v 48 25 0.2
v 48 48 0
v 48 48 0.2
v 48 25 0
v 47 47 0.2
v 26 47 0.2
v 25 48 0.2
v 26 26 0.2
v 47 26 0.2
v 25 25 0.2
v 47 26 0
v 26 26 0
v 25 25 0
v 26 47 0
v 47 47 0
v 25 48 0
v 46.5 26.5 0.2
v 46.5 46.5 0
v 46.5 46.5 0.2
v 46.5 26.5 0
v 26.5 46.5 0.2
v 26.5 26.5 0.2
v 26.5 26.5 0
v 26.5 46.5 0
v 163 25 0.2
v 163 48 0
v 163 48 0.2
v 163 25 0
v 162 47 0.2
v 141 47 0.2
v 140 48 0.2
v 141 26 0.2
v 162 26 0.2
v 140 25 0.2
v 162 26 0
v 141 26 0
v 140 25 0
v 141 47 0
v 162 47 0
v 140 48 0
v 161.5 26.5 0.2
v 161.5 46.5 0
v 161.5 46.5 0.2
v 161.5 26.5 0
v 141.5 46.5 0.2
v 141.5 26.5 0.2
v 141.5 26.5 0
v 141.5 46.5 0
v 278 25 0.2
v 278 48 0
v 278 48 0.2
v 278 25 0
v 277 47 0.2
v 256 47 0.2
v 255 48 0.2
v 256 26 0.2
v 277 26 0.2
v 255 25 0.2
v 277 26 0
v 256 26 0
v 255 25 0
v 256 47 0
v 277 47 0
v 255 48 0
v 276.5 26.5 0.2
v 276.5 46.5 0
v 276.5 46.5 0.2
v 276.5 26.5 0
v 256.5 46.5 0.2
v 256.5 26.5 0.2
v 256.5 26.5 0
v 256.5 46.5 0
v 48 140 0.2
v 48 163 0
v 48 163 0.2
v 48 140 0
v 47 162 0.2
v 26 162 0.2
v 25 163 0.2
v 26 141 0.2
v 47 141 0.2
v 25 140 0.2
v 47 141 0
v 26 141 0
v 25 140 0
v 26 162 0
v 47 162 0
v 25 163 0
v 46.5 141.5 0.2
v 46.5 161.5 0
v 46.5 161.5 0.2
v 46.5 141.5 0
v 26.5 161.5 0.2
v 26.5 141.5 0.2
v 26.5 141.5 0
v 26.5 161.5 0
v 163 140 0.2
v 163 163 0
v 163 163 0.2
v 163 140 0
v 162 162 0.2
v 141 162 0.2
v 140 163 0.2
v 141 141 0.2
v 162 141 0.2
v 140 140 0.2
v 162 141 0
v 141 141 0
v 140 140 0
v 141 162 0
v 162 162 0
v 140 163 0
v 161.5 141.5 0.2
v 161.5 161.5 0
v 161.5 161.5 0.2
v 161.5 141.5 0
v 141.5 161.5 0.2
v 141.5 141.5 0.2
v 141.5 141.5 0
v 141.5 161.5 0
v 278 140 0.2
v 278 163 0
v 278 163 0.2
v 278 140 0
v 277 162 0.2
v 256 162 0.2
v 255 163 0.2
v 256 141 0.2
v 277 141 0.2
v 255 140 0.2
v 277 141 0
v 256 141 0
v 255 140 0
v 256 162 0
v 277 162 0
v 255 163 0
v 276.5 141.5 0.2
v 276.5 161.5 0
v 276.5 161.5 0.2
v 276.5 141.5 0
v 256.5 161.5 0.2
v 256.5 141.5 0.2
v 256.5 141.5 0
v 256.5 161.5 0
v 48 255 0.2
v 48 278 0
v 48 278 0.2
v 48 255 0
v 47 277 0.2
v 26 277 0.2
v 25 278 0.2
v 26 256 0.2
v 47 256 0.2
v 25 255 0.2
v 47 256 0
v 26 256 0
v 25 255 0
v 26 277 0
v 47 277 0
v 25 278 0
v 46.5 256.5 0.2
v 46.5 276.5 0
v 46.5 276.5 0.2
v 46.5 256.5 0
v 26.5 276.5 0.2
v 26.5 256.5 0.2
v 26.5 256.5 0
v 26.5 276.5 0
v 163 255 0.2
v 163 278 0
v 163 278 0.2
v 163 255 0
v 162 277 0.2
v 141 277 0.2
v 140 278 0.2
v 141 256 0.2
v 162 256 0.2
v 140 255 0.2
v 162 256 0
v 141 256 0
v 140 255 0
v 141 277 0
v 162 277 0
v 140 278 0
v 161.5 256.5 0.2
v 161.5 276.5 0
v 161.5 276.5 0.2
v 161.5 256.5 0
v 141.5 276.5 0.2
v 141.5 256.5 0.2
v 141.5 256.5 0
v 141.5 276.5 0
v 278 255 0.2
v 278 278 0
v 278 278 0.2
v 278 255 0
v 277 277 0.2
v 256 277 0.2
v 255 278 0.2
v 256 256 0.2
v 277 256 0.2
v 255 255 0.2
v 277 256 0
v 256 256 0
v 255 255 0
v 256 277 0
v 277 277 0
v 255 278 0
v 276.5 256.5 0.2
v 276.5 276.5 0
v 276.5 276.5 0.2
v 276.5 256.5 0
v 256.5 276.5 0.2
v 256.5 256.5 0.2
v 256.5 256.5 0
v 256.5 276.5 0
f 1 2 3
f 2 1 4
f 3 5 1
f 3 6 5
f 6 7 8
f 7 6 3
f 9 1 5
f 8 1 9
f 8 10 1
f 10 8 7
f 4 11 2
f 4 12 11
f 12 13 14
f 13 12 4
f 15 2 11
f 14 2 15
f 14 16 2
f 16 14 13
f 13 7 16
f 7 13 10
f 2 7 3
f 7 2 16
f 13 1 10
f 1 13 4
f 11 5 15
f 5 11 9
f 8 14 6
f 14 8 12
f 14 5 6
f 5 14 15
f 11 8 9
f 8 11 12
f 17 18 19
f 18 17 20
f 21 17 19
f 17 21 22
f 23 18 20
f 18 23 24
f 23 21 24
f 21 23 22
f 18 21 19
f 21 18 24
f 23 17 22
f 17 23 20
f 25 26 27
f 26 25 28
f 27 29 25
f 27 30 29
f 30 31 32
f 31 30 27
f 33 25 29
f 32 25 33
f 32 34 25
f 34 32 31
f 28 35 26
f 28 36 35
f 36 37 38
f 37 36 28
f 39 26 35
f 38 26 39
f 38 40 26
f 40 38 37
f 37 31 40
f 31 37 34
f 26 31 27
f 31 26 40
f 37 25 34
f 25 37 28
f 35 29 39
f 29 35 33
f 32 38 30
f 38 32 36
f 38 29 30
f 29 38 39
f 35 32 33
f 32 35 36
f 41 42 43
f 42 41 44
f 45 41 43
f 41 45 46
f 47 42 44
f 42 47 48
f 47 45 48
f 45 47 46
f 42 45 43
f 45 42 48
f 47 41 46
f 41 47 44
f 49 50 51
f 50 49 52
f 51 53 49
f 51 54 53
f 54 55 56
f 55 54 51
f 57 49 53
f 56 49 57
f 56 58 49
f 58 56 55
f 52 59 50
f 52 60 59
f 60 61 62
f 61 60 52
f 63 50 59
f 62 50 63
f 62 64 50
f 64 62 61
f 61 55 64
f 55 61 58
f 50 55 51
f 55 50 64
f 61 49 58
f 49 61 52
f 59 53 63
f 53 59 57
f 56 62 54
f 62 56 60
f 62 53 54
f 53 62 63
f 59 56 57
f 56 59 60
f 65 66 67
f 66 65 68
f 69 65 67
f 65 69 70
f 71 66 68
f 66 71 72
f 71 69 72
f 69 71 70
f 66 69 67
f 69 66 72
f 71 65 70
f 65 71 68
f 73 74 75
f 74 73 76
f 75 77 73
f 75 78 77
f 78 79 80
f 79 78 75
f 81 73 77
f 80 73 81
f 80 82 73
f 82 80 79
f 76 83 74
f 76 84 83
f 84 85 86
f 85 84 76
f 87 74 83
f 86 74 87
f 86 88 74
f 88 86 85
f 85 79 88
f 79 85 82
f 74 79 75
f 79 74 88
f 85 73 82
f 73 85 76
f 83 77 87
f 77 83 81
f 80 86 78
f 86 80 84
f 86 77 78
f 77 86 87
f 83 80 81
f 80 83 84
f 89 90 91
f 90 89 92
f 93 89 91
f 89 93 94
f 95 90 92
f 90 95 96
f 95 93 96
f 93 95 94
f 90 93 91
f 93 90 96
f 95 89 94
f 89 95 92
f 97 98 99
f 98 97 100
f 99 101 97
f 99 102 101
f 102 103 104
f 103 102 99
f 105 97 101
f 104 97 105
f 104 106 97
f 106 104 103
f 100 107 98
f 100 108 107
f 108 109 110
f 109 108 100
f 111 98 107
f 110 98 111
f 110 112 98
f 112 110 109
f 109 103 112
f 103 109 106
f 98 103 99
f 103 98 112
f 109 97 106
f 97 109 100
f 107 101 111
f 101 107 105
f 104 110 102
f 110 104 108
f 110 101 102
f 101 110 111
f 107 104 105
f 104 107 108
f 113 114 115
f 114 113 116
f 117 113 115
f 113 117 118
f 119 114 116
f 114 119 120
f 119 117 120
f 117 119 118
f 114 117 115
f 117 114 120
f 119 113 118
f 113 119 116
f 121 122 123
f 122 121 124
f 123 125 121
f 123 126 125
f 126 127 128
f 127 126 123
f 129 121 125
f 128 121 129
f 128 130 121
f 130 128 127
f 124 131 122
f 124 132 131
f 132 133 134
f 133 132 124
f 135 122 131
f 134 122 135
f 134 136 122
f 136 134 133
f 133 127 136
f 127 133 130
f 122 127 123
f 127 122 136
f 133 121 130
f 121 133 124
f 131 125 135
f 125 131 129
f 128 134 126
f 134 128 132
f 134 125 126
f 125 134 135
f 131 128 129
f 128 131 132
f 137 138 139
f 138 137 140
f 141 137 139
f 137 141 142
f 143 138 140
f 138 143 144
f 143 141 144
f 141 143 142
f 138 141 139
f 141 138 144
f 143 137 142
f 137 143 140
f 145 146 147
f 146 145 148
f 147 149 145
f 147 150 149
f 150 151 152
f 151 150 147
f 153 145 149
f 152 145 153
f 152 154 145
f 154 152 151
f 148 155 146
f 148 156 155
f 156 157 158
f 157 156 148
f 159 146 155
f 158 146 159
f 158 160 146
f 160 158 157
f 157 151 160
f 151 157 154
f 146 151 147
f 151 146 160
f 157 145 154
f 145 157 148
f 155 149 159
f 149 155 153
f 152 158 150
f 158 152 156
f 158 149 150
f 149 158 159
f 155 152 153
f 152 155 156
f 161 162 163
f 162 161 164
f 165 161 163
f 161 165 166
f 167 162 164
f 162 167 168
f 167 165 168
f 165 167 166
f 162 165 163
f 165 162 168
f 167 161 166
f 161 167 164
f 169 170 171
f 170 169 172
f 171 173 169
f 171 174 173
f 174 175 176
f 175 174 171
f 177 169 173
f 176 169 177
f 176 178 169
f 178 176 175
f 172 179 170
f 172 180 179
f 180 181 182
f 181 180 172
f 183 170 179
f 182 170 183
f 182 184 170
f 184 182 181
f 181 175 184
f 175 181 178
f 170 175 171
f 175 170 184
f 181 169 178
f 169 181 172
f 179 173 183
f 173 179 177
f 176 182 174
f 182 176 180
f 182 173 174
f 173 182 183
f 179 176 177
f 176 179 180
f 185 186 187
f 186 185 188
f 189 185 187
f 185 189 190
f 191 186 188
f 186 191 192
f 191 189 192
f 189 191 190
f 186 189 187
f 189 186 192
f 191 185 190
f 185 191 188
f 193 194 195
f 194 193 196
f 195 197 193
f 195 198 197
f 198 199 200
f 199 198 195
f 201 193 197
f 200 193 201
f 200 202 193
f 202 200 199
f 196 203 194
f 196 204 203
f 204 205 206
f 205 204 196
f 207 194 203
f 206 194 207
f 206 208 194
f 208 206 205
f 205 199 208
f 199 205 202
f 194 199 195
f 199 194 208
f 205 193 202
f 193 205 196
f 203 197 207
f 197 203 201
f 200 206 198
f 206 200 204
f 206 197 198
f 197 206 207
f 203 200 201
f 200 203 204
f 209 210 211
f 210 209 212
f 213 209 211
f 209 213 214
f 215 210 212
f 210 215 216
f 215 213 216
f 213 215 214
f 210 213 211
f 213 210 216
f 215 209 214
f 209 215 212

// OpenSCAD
/**
 * Print designed to check that you bed is level
 *
 * print four small squares in each corner to ensure even print quality and good adhesion.
 */

// Define your printers printable area
// If you are using Sprinter firmware then these come directly from configuration.h

X_MAX_LENGTH = 300;
Y_MAX_LENGTH = 300;

THICKNESS = 0.2; //Square / outline thickness
SIZE = 20; //Square width / height
GAP = 0.5; //Width of border between square and parameter
OUTLINE_WIDTH = 1; //Width of parameter around square
OFFSET = 25; //Offset from limits in each axis

translate([OFFSET, OFFSET, 0]) square(); //Top Left
translate([(X_MAX_LENGTH / 2) - (SIZE / 2), OFFSET, 0]) square(); //Top Middle
translate([X_MAX_LENGTH - OFFSET - SIZE, OFFSET, 0]) square(); //Top Right

translate([OFFSET, (Y_MAX_LENGTH / 2) - (SIZE / 2), 0]) square(); //Middle Left
translate([(X_MAX_LENGTH / 2) - (SIZE / 2), (Y_MAX_LENGTH / 2) - (SIZE / 2), 0]) square(); //Middle Middle
translate([X_MAX_LENGTH - OFFSET - SIZE, (Y_MAX_LENGTH / 2) - (SIZE / 2), 0]) square(); //Middle Right

translate([OFFSET, Y_MAX_LENGTH - OFFSET - SIZE, 0]) square(); //Bottom Left
translate([(X_MAX_LENGTH / 2) - (SIZE / 2), Y_MAX_LENGTH - OFFSET - SIZE, 0]) square(); //Bottom Middle
translate([X_MAX_LENGTH - OFFSET - SIZE, Y_MAX_LENGTH - OFFSET - SIZE, 0]) square(); //Bottom Right

module square() {
	//Center square
	translate([
				OUTLINE_WIDTH + GAP,
				OUTLINE_WIDTH + GAP,
				0
			])
		cube([SIZE, SIZE, THICKNESS]);

	//Parameter
	difference() {
		//Outer square
		cube([
				SIZE + (2 * (GAP + OUTLINE_WIDTH)),
				SIZE + (2 * (GAP + OUTLINE_WIDTH)),
				THICKNESS
			]);

		//Inner square
		translate([OUTLINE_WIDTH, OUTLINE_WIDTH, -5])
			cube([SIZE + (2 * GAP), SIZE + (2 * GAP), 10]);
	}
}
